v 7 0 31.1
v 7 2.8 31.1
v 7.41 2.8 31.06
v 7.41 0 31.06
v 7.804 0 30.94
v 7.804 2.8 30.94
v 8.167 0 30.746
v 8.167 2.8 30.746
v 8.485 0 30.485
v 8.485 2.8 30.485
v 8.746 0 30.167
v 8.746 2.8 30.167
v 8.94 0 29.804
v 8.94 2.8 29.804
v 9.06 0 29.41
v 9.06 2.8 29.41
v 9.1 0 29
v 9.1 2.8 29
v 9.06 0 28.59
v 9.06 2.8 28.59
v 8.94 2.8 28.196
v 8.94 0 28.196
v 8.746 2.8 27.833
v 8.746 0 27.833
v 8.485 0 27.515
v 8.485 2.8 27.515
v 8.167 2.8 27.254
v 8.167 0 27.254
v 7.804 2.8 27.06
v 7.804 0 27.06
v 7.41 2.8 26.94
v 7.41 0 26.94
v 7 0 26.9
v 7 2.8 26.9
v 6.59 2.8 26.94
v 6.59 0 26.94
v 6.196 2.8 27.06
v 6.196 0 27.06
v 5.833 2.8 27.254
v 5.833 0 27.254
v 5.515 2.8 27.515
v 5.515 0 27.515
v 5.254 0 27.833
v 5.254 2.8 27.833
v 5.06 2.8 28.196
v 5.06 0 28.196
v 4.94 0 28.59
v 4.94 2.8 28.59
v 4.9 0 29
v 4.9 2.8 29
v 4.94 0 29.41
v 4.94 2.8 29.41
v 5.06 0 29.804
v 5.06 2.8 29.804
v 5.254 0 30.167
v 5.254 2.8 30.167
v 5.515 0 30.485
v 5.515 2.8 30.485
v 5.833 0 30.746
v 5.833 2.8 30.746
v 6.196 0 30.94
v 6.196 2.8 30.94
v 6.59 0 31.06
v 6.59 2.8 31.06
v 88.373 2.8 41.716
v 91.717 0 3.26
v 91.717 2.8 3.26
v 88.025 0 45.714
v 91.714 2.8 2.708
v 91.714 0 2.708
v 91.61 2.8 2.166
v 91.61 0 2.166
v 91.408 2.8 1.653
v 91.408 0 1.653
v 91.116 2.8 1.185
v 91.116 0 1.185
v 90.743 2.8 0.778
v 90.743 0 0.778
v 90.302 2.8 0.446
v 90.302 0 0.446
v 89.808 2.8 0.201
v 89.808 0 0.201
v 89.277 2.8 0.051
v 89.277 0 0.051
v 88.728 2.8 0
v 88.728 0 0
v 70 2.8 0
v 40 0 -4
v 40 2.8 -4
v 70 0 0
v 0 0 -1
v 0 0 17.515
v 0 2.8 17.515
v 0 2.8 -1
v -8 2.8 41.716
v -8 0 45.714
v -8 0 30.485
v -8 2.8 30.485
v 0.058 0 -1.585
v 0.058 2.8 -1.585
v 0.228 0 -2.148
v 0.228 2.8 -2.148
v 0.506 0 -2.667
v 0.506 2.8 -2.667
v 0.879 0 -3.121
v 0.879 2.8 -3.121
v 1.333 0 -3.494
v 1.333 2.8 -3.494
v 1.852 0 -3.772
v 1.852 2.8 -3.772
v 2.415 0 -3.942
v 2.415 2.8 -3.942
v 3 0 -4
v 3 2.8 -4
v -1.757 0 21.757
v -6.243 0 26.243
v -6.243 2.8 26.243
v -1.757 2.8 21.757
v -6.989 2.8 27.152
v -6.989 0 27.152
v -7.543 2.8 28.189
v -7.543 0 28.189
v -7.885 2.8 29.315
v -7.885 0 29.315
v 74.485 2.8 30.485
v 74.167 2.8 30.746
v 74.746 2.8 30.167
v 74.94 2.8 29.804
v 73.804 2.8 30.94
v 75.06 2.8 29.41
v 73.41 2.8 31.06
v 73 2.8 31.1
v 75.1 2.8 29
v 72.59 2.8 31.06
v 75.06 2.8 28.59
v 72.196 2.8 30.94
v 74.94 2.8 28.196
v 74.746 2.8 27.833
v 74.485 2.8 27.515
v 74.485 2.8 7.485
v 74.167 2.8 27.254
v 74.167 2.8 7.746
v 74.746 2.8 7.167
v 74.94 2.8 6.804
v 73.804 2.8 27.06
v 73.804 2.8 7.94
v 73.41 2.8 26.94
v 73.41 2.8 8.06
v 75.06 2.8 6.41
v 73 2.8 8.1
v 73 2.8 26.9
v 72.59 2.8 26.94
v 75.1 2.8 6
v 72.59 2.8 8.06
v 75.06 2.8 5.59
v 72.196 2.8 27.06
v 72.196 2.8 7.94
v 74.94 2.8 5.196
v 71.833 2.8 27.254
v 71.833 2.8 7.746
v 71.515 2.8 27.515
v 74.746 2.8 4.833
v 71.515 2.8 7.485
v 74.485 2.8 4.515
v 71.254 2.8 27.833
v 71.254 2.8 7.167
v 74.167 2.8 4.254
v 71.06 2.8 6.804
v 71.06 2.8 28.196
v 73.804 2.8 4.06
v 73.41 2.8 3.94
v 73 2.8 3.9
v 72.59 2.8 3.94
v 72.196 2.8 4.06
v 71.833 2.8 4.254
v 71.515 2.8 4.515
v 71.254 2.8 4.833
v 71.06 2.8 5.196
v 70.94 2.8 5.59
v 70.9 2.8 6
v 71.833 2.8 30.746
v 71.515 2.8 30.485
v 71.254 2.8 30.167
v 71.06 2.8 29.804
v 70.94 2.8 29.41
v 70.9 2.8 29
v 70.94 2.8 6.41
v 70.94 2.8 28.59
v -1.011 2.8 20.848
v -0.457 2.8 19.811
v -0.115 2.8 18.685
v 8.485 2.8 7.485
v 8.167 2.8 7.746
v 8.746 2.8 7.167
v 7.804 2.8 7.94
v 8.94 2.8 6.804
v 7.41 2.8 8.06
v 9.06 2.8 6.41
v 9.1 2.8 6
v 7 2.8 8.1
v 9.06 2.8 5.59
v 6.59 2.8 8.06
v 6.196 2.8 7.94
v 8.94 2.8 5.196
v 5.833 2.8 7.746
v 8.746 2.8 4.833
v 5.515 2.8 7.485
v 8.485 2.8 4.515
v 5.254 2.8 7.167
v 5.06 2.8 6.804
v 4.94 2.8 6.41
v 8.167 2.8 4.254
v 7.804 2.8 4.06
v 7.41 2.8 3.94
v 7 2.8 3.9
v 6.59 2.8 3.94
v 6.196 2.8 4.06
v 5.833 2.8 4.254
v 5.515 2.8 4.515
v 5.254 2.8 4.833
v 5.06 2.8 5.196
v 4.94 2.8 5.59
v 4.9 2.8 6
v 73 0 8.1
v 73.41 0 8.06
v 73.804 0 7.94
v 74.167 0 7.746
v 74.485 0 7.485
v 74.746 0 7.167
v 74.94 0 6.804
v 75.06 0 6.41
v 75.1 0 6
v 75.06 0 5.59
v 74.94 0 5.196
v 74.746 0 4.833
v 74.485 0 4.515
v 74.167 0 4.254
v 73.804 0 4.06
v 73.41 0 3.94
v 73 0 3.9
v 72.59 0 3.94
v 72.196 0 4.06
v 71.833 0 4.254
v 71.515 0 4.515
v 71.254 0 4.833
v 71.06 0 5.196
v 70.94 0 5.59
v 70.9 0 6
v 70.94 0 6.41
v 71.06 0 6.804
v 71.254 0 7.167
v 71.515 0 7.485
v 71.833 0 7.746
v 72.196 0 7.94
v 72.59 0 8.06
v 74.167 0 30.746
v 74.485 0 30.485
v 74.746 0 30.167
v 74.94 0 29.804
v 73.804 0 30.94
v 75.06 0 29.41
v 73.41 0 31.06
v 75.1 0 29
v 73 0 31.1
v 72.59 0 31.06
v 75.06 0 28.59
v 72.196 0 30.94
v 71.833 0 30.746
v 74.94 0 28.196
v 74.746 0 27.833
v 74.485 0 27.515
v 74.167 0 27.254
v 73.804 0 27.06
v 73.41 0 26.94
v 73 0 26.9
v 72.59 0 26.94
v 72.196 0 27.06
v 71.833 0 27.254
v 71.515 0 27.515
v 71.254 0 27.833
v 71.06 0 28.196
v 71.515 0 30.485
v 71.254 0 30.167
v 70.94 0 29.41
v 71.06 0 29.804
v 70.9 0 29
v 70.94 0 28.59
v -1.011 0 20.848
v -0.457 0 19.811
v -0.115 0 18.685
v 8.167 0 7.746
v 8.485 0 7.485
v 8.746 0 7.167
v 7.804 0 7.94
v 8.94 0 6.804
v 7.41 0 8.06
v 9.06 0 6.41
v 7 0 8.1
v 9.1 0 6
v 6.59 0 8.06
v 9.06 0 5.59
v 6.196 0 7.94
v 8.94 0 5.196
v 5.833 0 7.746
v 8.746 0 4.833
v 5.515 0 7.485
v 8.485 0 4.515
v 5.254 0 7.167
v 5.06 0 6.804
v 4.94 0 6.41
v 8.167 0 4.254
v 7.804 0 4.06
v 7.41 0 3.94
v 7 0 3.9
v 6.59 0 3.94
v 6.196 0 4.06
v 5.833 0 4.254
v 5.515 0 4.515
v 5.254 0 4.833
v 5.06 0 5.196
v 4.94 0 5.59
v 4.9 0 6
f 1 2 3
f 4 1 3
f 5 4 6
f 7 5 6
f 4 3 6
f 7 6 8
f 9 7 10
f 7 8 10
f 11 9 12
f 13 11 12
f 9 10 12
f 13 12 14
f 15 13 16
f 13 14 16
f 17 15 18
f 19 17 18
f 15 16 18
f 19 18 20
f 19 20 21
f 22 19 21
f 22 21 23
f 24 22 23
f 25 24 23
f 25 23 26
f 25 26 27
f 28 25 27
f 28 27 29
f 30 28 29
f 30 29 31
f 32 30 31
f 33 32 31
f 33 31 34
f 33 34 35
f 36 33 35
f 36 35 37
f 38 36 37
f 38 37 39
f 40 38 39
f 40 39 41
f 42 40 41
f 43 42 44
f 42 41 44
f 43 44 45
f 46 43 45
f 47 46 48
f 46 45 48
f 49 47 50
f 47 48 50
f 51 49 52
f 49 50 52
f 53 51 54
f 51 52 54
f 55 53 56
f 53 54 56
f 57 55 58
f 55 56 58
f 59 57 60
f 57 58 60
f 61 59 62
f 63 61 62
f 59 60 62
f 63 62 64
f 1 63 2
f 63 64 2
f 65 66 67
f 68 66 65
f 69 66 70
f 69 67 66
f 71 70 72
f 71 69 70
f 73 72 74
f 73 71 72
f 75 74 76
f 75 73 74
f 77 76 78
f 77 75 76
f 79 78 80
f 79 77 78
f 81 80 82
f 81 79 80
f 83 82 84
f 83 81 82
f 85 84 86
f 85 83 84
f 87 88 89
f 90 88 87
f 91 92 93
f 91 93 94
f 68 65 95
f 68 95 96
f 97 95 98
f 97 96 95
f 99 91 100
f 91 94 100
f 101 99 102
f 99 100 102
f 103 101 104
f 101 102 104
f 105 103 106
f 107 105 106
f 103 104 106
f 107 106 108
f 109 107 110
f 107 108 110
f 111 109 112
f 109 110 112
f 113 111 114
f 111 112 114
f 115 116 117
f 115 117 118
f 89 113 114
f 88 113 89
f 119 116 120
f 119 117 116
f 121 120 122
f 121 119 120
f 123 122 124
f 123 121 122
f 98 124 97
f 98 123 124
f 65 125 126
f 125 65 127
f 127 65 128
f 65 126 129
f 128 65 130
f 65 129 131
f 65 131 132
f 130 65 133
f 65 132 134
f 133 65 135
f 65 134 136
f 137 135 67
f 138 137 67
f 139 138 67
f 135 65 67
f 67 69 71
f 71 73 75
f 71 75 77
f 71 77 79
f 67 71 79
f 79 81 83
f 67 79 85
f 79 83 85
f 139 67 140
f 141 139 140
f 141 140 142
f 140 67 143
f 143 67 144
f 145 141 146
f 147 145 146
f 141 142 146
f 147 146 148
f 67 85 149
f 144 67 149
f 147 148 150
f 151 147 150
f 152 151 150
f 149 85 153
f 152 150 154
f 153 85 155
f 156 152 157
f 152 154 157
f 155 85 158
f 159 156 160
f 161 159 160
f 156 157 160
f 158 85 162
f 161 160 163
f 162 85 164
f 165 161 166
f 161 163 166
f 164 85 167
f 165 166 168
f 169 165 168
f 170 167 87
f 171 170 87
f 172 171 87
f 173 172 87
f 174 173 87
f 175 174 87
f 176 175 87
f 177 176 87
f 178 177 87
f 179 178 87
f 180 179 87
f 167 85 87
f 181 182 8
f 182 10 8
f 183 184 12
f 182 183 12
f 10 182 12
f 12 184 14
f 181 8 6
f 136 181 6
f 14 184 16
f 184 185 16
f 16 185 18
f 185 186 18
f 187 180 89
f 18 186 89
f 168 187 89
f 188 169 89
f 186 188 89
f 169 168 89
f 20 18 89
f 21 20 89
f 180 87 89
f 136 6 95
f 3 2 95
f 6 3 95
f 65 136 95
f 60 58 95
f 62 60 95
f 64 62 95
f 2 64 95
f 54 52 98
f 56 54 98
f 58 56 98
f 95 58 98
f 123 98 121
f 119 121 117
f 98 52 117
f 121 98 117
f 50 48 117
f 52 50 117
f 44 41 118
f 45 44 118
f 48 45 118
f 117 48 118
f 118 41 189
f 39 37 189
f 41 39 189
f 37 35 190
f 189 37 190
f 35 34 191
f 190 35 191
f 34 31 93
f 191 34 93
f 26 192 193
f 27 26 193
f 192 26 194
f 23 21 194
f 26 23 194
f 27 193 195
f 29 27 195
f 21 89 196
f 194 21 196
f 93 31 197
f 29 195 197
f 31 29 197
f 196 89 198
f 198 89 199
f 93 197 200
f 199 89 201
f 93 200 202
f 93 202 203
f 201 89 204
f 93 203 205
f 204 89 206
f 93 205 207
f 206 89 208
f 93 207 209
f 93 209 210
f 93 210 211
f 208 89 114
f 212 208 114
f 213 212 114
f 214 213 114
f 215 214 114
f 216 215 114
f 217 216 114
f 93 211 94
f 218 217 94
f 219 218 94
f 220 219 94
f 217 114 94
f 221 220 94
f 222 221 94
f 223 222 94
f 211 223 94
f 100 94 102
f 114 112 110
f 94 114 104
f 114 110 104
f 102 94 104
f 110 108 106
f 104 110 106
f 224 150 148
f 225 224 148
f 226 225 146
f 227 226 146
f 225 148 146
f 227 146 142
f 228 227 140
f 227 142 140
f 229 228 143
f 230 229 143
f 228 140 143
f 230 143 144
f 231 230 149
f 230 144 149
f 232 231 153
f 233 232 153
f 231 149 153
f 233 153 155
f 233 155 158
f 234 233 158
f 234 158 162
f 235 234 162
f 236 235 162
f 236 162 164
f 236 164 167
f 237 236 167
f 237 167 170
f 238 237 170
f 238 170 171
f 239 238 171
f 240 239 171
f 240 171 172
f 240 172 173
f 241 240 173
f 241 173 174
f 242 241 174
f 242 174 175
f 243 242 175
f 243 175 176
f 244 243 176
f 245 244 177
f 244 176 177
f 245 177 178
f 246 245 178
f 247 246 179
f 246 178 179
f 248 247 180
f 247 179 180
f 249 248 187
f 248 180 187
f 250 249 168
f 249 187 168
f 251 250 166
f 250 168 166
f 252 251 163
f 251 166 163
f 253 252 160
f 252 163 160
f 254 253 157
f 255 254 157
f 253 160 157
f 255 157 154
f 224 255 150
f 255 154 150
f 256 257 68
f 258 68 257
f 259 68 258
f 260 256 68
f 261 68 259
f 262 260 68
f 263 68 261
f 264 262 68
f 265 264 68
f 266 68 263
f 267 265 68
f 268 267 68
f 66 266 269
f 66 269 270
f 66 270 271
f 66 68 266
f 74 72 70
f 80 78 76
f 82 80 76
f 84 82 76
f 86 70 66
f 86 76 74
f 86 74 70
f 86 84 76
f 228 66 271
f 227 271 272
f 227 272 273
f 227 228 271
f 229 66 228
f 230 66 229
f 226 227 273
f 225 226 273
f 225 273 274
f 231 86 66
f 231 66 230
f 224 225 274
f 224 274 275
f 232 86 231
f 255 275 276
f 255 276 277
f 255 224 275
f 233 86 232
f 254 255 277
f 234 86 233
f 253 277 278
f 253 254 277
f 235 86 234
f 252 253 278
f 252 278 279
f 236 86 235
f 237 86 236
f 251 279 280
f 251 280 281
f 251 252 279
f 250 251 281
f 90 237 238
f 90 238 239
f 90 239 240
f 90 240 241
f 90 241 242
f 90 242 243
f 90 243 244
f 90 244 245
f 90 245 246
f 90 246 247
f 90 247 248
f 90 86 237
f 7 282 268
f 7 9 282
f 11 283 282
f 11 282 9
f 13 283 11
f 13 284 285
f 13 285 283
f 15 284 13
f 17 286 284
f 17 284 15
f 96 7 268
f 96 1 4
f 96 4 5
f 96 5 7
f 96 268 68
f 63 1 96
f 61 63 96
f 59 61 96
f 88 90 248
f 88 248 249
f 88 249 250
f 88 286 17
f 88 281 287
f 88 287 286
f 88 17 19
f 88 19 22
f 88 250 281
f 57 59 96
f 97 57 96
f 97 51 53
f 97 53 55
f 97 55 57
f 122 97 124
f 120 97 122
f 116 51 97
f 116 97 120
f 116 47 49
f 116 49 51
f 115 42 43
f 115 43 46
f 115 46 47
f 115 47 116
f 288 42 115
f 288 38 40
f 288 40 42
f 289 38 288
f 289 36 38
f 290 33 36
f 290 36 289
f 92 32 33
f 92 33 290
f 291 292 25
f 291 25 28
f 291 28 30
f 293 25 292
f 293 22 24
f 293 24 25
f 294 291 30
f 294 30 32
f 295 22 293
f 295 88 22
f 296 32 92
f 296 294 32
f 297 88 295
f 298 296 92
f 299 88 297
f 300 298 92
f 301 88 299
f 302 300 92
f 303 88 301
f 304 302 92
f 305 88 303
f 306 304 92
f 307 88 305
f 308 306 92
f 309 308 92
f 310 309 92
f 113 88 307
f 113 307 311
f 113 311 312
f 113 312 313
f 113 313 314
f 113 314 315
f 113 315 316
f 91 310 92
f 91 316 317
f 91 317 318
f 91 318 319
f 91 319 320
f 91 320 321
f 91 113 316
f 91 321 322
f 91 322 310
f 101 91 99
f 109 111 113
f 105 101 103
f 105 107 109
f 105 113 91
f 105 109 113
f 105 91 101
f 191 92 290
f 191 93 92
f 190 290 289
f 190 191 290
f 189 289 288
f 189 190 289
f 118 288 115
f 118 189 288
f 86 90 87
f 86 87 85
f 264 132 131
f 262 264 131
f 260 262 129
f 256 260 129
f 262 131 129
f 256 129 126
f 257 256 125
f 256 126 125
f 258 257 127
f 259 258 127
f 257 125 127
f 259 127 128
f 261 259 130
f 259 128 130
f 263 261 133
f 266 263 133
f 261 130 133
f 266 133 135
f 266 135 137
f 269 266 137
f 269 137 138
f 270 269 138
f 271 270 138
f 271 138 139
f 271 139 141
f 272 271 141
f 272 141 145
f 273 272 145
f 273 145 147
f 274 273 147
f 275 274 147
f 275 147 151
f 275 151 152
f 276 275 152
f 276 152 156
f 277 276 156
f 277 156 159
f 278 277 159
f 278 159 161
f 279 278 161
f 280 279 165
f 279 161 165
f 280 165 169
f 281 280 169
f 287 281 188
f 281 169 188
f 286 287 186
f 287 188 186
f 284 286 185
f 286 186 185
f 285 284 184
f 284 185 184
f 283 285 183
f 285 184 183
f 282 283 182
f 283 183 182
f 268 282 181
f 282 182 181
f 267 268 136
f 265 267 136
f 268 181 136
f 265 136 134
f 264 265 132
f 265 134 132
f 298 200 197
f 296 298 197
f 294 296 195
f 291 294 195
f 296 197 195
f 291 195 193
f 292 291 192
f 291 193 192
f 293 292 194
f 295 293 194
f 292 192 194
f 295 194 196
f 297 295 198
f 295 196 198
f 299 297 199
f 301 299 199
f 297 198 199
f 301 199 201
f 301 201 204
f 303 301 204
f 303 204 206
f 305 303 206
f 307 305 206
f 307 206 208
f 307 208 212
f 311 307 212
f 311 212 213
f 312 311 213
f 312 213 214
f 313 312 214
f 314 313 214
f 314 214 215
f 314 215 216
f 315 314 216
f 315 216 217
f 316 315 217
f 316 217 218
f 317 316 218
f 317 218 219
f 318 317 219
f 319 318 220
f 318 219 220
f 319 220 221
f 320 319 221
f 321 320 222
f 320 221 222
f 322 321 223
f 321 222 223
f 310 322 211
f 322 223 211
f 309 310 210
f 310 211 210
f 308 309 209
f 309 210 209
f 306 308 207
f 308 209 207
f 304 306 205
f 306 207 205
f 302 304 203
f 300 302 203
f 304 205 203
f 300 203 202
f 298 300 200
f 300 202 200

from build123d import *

# Parameters (mm, degrees)
BOSS_EXTRUDE1_DEPTH = 2.8
SKETCH2_R           = 2.1
CUT_EXTRUDE1_DEPTH  = 103.897230283
FILLET1_R           = 6
CHAMFER2_SIZE       = 4.28444402
CHAMFER2_SIZE_2     = 3
FILLET2_R           = 3


with BuildPart() as part:
    # Sketch1 → Boss-Extrude1 (new body)
    with BuildSketch(Plane(origin=(0, 0, 0), x_dir=(1, 0, 0), z_dir=(0, 1, 0))):
        Polygon((0, 4), (40, 4), (70, 0), (92, 0), (88, -46), (0, -46), (-8, -46), (-8, -28), (0, -20), align=None)
    extrude(amount=BOSS_EXTRUDE1_DEPTH)

    # Sketch2 → Cut-Extrude1 (cut, through all)
    with BuildSketch(Plane(origin=(0, 2.8, 0), x_dir=(1, 0, 0), z_dir=(0, 1, 0))):
        with Locations(Location((7, -6, 0), (0, 0, 270))):
            Circle(SKETCH2_R)
        with Locations(Location((7, -29, 0), (0, 0, 270))):
            Circle(SKETCH2_R)
        with Locations(Location((73, -6, 0), (0, 0, 270))):
            Circle(SKETCH2_R)
        with Locations(Location((73, -29, 0), (0, 0, 270))):
            Circle(SKETCH2_R)
    extrude(amount=-CUT_EXTRUDE1_DEPTH, mode=Mode.SUBTRACT)

    # Fillet1
    fillet1_edges = [part.edges().sort_by_distance(p)[0] for p in [
        (-8, 1.4, 28),
        (0, 1.4, 20),
    ]]
    fillet(fillet1_edges, radius=FILLET1_R)

    # Chamfer2
    # the kernel refuses this chamfer: 4.28444402, 3 mm, written as the material it takes off along each edge
    with BuildSketch(Plane(origin=(99.06480046, 2.8, 46), x_dir=(0, 0.02220967419845692, -0.99975333476413), z_dir=(-1, 0, 0))) as chamfer2_piece_1:
        Polygon((CHAMFER2_SIZE * 0.999753334817, CHAMFER2_SIZE * 0.0222096741996), (-CHAMFER2_SIZE_2 * 0.0222096741985, CHAMFER2_SIZE_2 * 0.999753334764), (0, 0), align=None)
    extrude(amount=118.12960092, mode=Mode.SUBTRACT)

    # Fillet2
    fillet2_edges = [part.edges().sort_by_distance(p)[0] for p in [
        (0, 1.4, -4),
        (92, 1.4, 0),
    ]]
    fillet(fillet2_edges, radius=FILLET2_R)


solid = part.part
